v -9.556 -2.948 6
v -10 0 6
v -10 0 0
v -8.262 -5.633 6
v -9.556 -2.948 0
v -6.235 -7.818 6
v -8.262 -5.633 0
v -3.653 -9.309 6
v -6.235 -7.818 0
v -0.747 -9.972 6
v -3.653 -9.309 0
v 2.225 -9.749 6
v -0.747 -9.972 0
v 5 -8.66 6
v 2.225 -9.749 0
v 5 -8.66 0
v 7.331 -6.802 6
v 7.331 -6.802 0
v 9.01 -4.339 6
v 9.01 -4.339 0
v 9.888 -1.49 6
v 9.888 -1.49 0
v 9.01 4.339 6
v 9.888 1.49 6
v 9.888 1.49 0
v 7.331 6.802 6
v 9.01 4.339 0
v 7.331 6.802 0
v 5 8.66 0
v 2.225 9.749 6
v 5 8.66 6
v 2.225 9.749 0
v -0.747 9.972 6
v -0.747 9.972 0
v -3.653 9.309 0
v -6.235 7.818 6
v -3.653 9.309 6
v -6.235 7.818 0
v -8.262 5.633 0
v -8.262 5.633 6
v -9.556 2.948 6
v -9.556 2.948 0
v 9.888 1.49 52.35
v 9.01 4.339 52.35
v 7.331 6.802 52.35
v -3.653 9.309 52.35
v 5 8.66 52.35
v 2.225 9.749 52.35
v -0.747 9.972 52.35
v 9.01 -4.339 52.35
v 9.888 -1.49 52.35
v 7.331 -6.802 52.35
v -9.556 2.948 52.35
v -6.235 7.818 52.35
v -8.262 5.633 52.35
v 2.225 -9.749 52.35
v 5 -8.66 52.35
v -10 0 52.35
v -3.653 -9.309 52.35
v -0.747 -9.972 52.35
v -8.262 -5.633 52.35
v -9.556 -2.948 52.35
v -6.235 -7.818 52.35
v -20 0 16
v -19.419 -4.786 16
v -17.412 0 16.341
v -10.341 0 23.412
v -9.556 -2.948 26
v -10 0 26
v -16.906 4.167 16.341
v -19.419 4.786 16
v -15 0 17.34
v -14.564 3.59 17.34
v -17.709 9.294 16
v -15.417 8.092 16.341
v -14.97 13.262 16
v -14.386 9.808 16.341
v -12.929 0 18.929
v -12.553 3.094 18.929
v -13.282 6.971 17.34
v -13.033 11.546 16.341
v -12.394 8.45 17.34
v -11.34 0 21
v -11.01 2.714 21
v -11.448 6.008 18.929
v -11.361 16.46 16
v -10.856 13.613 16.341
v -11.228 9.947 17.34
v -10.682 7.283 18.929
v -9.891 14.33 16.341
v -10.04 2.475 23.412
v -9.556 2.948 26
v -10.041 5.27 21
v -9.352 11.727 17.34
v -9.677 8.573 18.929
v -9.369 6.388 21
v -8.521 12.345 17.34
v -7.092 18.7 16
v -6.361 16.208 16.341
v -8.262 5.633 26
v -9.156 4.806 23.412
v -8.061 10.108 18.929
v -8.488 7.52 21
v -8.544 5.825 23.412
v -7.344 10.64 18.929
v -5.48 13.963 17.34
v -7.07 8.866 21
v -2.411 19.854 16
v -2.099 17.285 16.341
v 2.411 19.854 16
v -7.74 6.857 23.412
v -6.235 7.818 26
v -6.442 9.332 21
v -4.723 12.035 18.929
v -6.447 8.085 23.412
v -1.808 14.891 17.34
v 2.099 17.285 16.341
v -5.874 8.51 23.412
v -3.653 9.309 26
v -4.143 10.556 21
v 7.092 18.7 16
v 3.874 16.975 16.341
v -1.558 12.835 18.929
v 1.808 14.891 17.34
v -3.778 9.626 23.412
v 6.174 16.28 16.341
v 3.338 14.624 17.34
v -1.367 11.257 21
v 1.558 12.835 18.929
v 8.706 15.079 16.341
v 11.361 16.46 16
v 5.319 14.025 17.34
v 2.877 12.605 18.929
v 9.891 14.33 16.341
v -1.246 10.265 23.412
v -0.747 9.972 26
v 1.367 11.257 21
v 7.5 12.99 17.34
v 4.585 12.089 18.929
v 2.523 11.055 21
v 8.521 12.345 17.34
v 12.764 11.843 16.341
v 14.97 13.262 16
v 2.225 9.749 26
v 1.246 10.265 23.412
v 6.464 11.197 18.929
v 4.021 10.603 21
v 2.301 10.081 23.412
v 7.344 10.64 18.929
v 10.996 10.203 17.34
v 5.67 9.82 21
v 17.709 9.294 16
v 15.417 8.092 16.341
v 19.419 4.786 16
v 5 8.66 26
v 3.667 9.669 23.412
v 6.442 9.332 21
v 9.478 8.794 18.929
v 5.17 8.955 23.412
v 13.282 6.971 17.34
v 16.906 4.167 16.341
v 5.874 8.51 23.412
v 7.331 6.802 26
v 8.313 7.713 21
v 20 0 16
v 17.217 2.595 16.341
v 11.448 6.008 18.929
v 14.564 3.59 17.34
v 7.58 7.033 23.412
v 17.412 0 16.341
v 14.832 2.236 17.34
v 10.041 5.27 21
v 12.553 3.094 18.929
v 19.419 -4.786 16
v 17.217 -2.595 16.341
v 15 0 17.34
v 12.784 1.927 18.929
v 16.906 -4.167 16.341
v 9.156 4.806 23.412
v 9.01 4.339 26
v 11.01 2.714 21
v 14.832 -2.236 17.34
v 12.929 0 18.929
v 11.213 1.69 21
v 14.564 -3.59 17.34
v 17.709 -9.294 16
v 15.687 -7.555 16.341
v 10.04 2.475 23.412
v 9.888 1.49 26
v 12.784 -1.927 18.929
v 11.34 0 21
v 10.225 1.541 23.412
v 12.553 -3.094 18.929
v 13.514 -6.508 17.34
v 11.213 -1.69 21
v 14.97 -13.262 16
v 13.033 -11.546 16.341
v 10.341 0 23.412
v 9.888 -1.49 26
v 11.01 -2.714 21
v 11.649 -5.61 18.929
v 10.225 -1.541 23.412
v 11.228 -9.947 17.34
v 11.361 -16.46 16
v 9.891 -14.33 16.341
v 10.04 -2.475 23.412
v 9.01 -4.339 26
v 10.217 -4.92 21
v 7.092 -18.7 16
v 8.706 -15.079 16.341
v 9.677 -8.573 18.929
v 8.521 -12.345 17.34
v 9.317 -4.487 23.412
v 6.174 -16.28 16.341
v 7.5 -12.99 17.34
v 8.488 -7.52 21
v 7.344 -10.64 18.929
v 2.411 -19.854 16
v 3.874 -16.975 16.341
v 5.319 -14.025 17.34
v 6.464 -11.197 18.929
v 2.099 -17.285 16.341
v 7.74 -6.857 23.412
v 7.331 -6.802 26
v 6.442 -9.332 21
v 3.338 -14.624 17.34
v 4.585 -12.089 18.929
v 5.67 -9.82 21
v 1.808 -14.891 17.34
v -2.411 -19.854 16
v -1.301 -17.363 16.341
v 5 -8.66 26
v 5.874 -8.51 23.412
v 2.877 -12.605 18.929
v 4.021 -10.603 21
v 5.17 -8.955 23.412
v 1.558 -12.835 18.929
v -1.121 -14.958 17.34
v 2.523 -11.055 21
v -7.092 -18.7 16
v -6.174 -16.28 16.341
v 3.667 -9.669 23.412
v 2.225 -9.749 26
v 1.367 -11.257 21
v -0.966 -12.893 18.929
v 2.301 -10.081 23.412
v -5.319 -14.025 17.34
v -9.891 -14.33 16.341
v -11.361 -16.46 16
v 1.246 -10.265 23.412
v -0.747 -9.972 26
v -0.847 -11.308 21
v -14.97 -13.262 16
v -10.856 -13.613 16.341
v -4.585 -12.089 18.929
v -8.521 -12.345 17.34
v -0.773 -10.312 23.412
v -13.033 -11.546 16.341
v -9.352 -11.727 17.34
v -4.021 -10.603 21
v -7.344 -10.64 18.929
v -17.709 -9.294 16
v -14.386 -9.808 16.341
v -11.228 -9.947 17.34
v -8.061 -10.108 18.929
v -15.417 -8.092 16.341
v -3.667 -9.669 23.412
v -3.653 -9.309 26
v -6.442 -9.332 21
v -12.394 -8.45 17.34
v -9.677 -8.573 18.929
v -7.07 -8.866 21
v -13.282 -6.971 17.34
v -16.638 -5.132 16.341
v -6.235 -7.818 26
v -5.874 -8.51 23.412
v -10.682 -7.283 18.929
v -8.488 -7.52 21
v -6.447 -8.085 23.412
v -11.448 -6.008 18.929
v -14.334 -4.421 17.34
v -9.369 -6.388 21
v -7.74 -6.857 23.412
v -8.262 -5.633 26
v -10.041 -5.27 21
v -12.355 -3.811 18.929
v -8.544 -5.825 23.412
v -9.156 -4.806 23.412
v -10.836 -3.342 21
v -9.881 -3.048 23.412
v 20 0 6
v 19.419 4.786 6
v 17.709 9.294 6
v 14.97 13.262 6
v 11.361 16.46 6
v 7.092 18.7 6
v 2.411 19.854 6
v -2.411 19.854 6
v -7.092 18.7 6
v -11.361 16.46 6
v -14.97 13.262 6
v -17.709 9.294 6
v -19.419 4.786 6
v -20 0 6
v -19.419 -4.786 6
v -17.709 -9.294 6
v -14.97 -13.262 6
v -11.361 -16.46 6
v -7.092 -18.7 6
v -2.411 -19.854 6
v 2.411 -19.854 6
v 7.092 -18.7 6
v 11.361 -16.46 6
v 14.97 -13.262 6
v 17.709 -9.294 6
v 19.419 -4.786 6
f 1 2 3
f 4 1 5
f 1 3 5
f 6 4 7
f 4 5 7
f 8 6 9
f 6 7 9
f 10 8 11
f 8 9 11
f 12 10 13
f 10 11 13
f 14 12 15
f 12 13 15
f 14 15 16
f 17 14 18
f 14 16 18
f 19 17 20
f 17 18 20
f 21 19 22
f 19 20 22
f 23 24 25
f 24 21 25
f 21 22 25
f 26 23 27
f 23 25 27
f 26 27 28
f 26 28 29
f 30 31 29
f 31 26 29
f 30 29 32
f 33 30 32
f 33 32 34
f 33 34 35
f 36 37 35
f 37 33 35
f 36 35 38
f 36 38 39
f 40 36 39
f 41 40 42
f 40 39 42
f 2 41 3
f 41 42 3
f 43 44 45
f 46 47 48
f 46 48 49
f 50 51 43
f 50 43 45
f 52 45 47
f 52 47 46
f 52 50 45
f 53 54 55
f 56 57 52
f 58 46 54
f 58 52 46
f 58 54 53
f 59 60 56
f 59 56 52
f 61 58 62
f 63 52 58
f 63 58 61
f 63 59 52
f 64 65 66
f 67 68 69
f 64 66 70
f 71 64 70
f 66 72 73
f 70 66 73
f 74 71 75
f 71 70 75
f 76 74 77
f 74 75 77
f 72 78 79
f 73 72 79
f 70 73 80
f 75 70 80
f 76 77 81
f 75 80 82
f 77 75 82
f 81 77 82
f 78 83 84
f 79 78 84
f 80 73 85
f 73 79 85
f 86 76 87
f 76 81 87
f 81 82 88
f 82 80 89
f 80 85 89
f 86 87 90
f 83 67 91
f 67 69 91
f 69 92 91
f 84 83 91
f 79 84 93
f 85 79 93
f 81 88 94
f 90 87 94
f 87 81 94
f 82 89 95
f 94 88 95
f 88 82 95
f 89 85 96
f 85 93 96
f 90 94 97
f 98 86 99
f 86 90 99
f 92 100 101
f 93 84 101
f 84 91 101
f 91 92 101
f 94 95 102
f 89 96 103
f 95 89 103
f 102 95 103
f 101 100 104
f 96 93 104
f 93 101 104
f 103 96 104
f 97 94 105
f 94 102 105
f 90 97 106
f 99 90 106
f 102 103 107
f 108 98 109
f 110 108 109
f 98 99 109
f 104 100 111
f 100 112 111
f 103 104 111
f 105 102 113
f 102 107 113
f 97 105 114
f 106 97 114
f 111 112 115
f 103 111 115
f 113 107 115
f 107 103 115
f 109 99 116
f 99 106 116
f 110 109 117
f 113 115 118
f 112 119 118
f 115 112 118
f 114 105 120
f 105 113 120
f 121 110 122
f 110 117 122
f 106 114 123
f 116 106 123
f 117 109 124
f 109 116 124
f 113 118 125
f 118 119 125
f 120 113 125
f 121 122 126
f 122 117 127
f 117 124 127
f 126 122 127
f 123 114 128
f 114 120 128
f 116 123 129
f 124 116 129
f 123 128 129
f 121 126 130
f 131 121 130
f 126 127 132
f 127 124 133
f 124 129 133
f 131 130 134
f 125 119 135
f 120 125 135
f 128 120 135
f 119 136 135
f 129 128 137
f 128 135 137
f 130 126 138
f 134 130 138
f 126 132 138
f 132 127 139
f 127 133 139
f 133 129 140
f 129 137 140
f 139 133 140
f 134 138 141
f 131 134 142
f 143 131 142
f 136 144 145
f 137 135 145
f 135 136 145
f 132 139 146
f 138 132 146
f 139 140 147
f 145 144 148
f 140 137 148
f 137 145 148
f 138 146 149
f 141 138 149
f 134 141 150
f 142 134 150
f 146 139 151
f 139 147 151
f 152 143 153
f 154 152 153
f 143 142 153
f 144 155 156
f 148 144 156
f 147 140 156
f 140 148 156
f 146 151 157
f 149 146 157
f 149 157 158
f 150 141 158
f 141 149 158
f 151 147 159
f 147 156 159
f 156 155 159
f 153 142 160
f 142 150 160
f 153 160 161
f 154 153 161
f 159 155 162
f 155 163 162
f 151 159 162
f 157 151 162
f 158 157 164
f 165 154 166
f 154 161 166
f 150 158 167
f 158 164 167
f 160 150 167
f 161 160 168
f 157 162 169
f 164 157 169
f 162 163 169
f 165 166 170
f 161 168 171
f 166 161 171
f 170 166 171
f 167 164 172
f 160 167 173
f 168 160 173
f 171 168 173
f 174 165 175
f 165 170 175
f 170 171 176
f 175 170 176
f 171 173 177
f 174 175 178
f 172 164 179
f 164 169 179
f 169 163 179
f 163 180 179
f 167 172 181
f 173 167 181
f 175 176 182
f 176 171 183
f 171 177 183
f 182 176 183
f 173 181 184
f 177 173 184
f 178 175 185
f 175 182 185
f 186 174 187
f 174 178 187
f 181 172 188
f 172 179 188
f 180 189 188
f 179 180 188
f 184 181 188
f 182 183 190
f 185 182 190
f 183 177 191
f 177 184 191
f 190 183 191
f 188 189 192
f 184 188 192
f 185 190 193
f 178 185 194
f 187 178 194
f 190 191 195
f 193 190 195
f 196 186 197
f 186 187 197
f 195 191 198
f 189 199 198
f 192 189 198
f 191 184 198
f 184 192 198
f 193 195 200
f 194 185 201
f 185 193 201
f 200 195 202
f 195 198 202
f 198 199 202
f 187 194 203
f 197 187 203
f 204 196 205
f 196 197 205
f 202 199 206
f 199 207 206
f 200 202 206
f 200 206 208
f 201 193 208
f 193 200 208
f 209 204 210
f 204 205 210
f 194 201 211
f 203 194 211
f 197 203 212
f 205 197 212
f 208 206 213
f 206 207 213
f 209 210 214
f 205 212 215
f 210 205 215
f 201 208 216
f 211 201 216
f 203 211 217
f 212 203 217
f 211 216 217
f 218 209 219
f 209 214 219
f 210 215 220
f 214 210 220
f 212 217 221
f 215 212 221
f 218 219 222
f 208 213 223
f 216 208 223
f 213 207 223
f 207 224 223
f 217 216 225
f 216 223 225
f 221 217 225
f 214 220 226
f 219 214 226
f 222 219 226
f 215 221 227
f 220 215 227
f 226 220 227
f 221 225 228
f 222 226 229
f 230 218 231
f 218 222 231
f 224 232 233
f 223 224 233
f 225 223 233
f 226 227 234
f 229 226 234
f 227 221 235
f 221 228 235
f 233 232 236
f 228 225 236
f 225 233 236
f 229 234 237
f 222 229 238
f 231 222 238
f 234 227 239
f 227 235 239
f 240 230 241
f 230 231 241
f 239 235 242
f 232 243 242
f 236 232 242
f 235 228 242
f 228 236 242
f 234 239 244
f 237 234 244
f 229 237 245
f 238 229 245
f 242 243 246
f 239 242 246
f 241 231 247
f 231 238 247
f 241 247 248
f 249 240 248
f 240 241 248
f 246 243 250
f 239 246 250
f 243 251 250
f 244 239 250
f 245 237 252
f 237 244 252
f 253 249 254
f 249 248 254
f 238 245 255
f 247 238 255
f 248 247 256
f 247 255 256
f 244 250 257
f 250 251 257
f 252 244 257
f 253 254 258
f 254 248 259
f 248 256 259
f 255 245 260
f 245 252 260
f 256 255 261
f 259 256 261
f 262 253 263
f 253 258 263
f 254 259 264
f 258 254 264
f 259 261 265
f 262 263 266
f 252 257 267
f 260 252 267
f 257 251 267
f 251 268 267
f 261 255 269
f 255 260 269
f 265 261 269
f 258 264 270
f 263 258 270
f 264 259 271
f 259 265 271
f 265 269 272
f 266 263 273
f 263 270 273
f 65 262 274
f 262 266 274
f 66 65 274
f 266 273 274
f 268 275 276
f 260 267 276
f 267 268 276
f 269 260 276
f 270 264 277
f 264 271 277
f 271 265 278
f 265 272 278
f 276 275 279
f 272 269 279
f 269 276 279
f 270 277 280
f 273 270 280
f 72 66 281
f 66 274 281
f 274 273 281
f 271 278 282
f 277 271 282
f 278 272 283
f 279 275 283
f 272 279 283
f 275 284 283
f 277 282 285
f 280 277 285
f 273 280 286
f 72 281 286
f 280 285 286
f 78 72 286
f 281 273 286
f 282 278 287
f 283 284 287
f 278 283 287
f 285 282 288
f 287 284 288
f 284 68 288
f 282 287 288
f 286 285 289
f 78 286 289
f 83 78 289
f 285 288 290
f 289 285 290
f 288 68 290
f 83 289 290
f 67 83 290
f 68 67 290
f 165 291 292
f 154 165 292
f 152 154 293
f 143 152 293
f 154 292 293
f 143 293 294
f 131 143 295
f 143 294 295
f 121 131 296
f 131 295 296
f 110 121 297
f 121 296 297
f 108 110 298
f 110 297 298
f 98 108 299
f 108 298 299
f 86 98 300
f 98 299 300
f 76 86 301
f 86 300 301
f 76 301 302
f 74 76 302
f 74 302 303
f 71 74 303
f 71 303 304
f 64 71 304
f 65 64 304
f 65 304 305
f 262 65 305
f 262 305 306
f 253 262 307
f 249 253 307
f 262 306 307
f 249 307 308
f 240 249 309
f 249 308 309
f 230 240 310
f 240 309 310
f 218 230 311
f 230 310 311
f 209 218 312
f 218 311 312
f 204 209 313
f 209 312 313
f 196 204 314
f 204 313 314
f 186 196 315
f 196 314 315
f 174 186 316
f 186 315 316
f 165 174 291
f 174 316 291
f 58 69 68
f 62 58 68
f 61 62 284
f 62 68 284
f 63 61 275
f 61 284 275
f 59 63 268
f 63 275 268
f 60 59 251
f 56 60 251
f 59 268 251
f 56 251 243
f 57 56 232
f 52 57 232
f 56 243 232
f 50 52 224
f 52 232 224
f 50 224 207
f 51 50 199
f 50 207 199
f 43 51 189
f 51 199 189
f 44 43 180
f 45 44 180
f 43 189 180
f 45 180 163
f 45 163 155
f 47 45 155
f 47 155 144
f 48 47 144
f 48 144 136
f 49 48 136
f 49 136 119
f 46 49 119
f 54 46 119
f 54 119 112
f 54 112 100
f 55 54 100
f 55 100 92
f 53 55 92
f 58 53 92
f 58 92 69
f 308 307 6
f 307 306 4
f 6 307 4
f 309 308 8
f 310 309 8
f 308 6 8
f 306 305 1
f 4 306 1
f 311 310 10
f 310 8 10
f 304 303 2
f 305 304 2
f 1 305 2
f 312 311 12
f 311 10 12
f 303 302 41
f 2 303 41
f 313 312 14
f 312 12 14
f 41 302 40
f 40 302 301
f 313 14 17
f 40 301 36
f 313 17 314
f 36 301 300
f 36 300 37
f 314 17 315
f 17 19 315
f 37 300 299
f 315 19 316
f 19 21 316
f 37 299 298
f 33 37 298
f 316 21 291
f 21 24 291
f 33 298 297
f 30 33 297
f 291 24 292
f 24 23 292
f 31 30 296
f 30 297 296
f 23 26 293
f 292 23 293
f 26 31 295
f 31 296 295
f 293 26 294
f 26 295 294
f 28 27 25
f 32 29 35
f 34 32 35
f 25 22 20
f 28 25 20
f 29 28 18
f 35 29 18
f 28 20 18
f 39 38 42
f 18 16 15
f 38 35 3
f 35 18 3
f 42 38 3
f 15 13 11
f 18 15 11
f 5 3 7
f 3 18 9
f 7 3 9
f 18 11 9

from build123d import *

# Parameters (mm, degrees)
ESQUISSE1_R        = 10
BOSS_EXTRU_1_DEPTH = 52.35
BOSS_EXTRU_2_START = 6
ESQUISSE2_R        = 20
BOSS_EXTRU_2_DEPTH = 10
CONG_1_R           = 10


with BuildPart() as part:
    # Esquisse1 → Boss.-Extru.1 (new body)
    with BuildSketch(Plane.XY):
        with Locations(Location((0, 0, 0), (0, 0, 180))):
            Circle(ESQUISSE1_R)
    extrude(amount=BOSS_EXTRU_1_DEPTH)

    # Esquisse2 → Boss.-Extru.2 (add)
    with BuildSketch(Plane.XY.offset(BOSS_EXTRU_2_START)):
        Circle(ESQUISSE2_R)
    extrude(amount=BOSS_EXTRU_2_DEPTH)

    # Congé1
    cong_1_edges = [part.edges().sort_by_distance(p)[0] for p in [
        (10, 0, 16),
    ]]
    fillet(cong_1_edges, radius=CONG_1_R - 0.0001)  # a hair under: the kernel refuses the full size


solid = part.part
